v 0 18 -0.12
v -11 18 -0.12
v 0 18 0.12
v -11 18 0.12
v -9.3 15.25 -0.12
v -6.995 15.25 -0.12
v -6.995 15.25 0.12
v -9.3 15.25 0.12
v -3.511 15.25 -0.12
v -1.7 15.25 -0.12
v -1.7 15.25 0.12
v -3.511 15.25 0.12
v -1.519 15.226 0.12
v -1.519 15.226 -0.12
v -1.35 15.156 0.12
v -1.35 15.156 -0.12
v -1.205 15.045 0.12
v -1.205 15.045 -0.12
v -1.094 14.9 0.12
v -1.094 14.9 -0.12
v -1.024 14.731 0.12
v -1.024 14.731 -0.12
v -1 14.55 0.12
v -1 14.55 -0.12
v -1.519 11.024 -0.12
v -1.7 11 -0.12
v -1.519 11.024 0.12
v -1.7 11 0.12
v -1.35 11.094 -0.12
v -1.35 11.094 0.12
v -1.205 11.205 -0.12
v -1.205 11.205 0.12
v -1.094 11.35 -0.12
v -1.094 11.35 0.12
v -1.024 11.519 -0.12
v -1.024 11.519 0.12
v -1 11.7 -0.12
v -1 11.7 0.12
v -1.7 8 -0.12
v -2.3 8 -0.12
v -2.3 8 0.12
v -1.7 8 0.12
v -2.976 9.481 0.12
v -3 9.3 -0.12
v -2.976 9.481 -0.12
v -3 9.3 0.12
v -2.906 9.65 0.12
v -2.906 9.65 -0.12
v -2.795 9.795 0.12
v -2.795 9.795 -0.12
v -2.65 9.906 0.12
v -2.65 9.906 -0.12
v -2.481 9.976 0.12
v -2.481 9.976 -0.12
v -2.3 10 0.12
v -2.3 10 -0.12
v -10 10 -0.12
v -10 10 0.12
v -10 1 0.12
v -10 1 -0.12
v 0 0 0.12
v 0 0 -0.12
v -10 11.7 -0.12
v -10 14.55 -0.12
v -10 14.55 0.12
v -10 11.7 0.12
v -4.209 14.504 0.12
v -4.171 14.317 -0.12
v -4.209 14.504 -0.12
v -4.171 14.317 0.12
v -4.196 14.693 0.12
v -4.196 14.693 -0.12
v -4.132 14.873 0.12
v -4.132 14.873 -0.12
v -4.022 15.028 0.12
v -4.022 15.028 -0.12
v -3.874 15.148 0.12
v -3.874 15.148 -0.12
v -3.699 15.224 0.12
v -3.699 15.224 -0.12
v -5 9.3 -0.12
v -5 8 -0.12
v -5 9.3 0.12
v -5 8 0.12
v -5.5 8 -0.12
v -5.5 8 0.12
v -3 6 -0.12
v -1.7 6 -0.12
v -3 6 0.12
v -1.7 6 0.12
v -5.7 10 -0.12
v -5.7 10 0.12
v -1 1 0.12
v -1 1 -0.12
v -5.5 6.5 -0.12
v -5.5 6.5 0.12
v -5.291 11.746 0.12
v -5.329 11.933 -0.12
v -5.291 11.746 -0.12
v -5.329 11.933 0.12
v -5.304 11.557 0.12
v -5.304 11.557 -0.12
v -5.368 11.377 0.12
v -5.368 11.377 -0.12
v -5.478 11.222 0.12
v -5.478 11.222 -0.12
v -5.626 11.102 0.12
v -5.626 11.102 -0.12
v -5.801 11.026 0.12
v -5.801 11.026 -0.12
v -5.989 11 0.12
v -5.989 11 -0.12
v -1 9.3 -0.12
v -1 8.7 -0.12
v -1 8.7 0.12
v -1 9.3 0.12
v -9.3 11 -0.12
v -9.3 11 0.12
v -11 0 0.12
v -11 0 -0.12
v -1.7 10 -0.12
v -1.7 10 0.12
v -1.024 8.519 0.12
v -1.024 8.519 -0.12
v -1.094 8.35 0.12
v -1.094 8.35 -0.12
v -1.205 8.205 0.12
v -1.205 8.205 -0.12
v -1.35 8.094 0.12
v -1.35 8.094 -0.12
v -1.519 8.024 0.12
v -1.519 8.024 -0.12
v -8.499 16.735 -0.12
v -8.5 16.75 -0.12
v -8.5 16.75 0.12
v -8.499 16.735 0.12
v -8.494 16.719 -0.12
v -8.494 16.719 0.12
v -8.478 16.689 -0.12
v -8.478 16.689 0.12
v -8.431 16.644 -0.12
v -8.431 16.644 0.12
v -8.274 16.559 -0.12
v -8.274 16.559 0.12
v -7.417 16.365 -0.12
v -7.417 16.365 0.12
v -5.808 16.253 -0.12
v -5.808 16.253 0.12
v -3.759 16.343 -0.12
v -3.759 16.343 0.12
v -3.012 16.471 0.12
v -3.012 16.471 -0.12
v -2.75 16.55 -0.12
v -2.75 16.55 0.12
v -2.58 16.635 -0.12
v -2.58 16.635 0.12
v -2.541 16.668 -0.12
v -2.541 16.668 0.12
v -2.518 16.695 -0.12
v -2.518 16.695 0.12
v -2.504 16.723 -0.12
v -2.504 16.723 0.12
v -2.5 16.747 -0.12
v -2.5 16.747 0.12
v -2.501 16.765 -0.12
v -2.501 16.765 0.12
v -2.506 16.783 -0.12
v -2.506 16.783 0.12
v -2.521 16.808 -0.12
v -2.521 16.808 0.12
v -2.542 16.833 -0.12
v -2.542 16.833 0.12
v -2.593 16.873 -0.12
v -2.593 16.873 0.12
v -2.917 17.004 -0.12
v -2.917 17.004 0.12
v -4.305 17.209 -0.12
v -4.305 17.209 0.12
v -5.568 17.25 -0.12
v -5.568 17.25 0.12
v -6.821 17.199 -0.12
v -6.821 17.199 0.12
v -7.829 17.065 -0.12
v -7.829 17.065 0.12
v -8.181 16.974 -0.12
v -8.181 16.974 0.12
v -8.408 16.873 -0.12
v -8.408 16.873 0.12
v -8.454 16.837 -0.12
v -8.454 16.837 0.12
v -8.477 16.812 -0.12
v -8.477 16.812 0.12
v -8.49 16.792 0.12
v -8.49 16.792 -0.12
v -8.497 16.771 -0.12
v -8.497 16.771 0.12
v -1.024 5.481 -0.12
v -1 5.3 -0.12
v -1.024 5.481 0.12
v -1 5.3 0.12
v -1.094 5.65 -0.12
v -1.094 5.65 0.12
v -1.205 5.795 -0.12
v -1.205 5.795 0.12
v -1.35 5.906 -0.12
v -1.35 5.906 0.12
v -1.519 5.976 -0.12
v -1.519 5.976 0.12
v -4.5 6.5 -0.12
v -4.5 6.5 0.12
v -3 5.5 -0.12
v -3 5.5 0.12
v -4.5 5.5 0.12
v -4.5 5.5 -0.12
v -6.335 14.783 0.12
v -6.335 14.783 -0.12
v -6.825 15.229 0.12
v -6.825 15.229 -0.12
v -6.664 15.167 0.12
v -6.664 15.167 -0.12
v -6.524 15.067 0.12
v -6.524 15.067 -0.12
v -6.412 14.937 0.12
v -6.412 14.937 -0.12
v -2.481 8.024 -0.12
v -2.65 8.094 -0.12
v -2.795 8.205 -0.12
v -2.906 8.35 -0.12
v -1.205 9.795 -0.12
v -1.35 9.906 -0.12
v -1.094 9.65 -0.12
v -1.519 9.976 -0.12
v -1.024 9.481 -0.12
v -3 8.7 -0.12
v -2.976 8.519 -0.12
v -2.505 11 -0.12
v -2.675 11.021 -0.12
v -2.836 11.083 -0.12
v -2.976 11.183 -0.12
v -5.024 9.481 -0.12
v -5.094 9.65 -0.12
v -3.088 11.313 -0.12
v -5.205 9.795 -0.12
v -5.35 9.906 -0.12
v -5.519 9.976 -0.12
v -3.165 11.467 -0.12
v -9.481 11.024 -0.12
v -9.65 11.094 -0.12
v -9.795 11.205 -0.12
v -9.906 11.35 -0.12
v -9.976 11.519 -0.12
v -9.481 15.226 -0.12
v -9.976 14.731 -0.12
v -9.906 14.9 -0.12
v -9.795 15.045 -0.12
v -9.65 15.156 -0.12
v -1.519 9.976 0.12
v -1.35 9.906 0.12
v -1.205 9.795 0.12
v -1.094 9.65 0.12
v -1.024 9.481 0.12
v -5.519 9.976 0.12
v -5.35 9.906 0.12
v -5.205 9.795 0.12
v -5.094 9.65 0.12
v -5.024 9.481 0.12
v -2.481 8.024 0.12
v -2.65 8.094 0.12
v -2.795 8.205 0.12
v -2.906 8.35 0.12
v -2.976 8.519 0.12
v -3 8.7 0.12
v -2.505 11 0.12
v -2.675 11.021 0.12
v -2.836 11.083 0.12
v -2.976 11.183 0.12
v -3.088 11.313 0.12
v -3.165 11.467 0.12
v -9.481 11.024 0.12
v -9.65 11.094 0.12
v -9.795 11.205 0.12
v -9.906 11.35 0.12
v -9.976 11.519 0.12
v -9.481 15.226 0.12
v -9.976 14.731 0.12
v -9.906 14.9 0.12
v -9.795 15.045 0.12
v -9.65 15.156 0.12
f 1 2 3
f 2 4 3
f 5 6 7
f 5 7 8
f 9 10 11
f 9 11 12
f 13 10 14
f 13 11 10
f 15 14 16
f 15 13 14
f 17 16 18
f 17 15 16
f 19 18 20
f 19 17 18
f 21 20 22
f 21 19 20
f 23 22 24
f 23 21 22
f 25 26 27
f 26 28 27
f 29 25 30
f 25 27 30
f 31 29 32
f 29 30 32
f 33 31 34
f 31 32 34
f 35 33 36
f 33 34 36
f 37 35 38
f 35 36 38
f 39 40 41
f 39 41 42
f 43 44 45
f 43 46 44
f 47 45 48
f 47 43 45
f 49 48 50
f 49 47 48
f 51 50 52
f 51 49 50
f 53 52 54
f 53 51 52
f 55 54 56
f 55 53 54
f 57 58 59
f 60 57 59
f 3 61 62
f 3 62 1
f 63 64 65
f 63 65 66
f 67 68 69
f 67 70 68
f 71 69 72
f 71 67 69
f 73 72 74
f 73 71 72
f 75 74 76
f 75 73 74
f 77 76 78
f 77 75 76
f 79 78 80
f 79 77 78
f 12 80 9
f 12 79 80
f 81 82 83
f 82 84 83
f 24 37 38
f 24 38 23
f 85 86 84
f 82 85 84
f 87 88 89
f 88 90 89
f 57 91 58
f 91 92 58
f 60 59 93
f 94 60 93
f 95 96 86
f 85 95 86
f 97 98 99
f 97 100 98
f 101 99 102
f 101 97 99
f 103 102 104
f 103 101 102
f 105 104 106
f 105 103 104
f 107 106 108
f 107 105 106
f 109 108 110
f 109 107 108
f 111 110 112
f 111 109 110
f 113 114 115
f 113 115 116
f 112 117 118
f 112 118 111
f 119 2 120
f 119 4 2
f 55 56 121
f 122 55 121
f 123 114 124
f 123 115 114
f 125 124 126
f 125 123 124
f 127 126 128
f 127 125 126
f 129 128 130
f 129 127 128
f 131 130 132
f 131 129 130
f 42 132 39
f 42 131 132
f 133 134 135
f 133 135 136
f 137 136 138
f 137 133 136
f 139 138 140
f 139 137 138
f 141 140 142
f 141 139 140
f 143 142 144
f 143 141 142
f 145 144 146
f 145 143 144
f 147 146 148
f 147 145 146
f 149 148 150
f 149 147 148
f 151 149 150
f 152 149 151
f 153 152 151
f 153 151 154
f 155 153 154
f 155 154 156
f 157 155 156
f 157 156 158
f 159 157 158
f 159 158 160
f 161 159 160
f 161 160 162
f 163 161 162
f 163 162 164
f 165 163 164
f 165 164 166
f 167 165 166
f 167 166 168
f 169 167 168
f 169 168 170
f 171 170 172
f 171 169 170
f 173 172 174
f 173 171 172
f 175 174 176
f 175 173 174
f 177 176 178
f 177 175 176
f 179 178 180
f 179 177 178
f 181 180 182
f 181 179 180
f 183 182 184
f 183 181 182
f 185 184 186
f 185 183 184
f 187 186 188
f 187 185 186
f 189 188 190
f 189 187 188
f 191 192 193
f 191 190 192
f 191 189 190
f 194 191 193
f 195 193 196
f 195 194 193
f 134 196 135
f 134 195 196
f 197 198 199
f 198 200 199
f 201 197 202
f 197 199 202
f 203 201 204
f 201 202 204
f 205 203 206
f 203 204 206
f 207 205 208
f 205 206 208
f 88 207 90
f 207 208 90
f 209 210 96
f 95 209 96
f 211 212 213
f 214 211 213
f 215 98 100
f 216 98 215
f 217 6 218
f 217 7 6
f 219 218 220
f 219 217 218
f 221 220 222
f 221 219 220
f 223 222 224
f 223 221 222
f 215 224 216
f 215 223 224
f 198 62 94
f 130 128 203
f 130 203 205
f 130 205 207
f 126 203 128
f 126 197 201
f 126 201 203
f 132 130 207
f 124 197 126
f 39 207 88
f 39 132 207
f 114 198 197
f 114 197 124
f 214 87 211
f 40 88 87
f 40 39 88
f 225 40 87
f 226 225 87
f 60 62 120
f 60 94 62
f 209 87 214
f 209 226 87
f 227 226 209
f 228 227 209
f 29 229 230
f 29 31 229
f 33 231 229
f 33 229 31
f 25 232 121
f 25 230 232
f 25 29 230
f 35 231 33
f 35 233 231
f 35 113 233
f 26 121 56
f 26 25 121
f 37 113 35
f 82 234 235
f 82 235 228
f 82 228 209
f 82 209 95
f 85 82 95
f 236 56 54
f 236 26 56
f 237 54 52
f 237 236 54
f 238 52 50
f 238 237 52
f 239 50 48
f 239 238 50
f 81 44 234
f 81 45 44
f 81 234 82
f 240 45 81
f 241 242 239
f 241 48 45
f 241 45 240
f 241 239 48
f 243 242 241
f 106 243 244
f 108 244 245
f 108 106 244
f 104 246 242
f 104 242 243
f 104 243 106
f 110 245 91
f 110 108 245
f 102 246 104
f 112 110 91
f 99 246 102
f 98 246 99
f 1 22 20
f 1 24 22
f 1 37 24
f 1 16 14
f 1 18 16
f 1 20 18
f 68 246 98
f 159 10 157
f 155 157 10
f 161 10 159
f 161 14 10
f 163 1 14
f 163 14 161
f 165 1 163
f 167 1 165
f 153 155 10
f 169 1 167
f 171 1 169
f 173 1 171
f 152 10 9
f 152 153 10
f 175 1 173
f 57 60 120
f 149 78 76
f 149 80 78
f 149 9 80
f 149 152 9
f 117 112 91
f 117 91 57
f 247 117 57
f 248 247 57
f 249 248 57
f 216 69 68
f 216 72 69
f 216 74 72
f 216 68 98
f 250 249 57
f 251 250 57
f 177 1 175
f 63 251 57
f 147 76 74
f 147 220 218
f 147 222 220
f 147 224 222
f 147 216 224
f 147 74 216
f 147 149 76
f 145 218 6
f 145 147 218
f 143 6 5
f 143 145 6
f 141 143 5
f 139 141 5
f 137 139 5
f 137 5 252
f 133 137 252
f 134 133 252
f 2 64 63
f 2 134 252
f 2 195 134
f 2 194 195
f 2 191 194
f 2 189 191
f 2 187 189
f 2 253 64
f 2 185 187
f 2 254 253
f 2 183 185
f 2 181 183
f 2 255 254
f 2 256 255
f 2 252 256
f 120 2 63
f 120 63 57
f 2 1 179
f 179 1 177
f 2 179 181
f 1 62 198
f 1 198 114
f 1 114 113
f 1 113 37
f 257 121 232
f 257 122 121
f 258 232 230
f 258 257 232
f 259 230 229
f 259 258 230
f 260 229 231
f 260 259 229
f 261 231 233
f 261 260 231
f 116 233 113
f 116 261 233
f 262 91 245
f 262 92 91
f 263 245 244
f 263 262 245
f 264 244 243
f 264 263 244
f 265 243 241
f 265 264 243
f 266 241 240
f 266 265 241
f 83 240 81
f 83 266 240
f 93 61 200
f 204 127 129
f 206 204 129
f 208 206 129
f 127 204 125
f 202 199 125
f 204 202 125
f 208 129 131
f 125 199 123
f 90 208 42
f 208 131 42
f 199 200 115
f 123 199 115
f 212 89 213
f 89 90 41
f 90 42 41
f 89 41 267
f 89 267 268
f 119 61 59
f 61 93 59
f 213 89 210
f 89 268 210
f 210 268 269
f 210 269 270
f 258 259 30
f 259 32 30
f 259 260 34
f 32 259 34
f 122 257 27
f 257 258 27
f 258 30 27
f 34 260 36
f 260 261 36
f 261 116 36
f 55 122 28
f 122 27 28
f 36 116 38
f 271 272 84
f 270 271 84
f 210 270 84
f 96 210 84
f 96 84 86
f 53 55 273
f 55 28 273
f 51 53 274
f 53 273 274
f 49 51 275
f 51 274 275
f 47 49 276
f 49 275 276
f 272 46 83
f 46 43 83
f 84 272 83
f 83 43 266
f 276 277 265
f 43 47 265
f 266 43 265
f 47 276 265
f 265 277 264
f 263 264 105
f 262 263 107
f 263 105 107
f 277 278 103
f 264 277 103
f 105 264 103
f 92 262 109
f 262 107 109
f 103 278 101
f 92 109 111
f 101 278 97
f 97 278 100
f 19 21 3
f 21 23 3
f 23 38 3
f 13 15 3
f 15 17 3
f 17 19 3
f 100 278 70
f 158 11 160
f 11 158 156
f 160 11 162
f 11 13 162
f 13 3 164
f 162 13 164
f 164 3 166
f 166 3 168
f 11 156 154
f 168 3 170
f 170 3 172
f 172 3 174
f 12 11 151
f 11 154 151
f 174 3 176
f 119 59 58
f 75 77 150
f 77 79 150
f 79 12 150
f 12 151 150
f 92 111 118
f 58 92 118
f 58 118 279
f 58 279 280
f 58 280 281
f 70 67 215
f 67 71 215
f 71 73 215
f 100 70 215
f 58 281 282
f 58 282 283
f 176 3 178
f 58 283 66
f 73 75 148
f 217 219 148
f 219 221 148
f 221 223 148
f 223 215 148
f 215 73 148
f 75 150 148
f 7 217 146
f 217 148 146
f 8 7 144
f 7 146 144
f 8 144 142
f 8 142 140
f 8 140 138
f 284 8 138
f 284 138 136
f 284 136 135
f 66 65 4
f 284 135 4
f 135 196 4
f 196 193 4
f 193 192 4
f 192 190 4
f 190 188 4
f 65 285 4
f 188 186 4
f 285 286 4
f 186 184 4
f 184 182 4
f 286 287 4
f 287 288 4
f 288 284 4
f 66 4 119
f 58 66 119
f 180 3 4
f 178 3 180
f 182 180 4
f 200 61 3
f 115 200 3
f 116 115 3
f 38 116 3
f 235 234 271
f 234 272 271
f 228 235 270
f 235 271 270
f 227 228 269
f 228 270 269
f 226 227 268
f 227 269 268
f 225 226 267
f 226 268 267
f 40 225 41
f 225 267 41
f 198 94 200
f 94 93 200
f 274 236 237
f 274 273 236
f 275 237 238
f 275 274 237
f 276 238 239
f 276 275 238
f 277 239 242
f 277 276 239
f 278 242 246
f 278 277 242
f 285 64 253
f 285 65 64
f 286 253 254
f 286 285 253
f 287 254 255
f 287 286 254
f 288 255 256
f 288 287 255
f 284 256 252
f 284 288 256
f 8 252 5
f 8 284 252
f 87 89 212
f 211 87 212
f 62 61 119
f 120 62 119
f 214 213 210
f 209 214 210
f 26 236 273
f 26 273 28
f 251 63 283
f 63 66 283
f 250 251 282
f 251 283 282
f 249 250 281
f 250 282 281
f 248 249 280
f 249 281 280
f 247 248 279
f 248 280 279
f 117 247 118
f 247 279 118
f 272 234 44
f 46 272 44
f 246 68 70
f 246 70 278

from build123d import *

# Parameters (mm, degrees)
BOSS_EXTRUDE1_DEPTH     = 0.12
CUT_EXTRUDE1_DEPTH      = 22.096388316
CUT_EXTRUDE1_DEPTH_BACK = 22.096388316
SKETCH3_RX              = 3
SKETCH3_RY              = 0.5
SKETCH3_W               = 2
SKETCH3_H               = 2
FILLET1_R               = 0.7


with BuildPart() as part:
    # Sketch1 → Boss-Extrude1 (new, symmetric)
    with BuildSketch(Plane.XY):
        Polygon((0, 0), (-11, 0), (-11, 11), (-11, 18), (0, 18), (0, 11), align=None)
        Polygon((-1, 1), (-1, 6), (-3, 6), (-3, 5.5), (-4.5, 5.5), (-4.5, 6.5), (-5.5, 6.5), (-5.5, 8), (-5, 8), (-5, 10), (-10, 10), (-10, 1), align=None, mode=Mode.SUBTRACT)
    extrude(amount=BOSS_EXTRUDE1_DEPTH, both=True)

    # Sketch3 → Cut-Extrude1 (cut, two sides: drawn at the far end of the back side and taken through both)
    with BuildSketch(Plane.XY.offset(0.12).offset(-CUT_EXTRUDE1_DEPTH_BACK)):
        with Locations(Location((-5.5, 16.75), (0, 0, 180))):
            Ellipse(SKETCH3_RX, SKETCH3_RY)
        Polygon((-10, 11), (-5, 11), (-6.5, 15.25), (-10, 15.25), align=None)
        Polygon((-1, 11), (-1, 15.25), (-4.5, 15.25), (-3, 11), align=None)
        with Locations((-2, 9)):
            Rectangle(SKETCH3_W, SKETCH3_H)
    extrude(amount=CUT_EXTRUDE1_DEPTH + CUT_EXTRUDE1_DEPTH_BACK, mode=Mode.SUBTRACT)

    # Fillet1
    fillet1_edges = [part.edges().sort_by_distance(p)[0] for p in [
        (-1, 6, 0),
        (-5, 10, 0),
        (-1, 10, 0),
        (-1, 8, 0),
        (-3, 8, 0),
        (-3, 10, 0),
        (-4.5, 15.25, 0),
        (-1, 15.25, 0),
        (-1, 11, 0),
        (-3, 11, 0),
        (-10, 11, 0),
        (-10, 15.25, 0),
        (-6.5, 15.25, 0),
        (-5, 11, 0),
    ]]
    fillet(fillet1_edges, radius=FILLET1_R)


solid = part.part
